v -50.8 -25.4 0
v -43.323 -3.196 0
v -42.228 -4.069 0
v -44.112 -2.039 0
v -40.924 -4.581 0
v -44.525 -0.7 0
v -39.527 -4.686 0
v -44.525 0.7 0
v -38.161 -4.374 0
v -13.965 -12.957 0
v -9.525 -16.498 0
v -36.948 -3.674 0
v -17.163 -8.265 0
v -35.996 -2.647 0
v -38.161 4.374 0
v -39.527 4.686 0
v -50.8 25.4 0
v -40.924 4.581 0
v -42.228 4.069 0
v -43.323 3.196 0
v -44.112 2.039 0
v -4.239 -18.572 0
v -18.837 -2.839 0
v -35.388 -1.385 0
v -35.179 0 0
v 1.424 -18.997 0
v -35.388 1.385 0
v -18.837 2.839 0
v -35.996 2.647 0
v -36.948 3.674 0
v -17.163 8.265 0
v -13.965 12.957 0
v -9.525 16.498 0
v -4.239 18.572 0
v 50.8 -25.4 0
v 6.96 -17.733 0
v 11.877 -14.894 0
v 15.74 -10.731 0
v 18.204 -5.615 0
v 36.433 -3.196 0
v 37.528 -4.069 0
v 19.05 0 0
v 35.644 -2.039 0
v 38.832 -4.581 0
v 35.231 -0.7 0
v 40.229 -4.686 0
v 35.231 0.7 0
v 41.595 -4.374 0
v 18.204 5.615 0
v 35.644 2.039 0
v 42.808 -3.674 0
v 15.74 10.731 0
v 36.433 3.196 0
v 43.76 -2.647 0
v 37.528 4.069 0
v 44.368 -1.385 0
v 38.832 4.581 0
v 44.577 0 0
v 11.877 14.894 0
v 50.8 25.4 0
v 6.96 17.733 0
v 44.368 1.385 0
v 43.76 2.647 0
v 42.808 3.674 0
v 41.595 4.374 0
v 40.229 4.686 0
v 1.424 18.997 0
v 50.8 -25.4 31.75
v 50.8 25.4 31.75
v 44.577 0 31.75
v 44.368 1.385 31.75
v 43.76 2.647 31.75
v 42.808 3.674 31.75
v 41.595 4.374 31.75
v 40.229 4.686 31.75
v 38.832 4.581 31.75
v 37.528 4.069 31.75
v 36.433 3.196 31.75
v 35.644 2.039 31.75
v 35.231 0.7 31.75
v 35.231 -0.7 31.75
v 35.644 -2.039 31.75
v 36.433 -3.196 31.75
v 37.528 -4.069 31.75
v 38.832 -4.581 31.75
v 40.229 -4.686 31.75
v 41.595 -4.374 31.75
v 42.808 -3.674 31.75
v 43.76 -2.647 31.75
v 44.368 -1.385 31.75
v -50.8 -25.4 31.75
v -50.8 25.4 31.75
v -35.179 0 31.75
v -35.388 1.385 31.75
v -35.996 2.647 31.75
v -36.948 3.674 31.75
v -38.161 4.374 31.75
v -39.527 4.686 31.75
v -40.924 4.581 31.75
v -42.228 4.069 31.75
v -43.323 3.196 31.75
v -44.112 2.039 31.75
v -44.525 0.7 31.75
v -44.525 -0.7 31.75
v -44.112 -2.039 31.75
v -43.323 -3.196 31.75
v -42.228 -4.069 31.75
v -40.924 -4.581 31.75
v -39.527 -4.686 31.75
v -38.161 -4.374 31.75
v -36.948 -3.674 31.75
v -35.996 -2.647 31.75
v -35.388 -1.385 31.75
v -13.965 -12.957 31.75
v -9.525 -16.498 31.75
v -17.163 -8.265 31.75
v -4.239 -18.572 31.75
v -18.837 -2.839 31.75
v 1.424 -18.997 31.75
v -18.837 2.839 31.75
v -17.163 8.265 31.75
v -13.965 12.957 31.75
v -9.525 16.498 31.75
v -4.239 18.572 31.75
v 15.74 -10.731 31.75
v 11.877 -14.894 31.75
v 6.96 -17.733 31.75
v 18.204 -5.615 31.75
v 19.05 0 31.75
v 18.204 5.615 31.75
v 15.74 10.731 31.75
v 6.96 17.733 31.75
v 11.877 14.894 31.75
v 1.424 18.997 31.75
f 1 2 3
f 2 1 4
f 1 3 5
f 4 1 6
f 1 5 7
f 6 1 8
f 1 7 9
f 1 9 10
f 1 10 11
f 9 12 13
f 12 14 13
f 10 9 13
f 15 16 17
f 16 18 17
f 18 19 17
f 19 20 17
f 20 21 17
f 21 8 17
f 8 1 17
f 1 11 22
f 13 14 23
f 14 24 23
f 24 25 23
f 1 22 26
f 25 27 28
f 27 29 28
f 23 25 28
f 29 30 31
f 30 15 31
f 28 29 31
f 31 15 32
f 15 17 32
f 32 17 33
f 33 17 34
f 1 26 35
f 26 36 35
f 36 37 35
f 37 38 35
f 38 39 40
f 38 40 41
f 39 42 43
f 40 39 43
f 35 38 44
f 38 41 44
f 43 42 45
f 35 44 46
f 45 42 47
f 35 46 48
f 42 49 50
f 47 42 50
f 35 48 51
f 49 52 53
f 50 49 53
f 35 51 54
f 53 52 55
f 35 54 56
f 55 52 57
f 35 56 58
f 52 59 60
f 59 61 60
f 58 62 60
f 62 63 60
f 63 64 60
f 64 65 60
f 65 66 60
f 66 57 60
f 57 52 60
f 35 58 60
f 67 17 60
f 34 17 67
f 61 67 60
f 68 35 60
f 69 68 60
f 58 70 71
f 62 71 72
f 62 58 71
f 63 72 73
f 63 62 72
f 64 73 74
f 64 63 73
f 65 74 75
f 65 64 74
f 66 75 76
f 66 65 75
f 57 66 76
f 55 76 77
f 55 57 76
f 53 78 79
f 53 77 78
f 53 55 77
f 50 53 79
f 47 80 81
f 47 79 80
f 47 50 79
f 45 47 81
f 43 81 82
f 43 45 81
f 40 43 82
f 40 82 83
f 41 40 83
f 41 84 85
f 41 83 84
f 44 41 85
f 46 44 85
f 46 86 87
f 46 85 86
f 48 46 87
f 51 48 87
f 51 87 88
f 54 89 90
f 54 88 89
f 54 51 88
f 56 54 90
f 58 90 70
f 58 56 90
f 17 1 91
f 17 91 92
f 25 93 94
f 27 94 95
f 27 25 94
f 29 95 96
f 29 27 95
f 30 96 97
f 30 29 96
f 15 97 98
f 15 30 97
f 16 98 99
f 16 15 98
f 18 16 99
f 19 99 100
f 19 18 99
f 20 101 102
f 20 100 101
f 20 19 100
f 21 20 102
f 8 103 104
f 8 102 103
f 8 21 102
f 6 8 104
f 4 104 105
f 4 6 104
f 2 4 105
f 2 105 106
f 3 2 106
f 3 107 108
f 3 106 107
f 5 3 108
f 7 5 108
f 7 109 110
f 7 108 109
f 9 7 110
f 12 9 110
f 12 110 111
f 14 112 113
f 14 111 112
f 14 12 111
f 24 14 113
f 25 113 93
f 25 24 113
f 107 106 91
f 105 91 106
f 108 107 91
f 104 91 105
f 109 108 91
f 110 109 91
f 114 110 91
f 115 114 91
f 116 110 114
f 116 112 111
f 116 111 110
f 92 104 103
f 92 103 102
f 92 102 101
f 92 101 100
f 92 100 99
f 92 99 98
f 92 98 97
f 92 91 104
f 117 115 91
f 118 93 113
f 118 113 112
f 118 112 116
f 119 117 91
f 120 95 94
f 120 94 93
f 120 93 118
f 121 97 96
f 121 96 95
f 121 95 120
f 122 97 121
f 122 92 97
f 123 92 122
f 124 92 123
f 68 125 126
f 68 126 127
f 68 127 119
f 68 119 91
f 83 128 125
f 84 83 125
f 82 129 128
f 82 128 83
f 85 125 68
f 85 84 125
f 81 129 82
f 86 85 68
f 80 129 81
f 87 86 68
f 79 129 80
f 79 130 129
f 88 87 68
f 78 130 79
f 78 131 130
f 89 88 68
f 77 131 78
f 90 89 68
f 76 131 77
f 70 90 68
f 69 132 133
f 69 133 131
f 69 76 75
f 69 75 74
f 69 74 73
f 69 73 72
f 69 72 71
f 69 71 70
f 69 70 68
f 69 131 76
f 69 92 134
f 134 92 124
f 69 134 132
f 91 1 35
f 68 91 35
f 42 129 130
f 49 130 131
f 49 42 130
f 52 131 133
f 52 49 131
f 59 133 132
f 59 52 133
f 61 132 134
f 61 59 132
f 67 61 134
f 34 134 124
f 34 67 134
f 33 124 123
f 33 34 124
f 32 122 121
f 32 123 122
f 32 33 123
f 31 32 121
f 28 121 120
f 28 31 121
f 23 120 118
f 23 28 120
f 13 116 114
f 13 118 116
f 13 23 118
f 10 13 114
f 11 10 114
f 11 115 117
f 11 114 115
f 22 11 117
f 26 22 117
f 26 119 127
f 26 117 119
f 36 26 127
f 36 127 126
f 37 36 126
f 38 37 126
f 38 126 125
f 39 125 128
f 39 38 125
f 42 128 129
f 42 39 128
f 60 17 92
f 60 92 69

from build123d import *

# Parameters (mm, degrees)
F0_W     = 101.6
F0_H     = 50.8
F1_DEPTH = 31.75
F2_R     = 19.05
F3_DEPTH = 31.751
F4_R     = 4.699
F5_DEPTH = 31.751


with BuildPart() as f1:
    # F0 (on Top) → F1 (new body)
    with BuildSketch(Plane.XY):
        Rectangle(F0_W, F0_H)
    extrude(amount=F1_DEPTH)

    # F2 (on Top) → F3 (cut, through all)
    with BuildSketch(Plane.XY):
        Circle(F2_R)
    extrude(amount=F3_DEPTH, mode=Mode.SUBTRACT)

    # F4 (on Top) → F5 (cut, through all)
    with BuildSketch(Plane.XY):
        with Locations((-39.878, 0)):
            Circle(F4_R)
        with Locations((39.878, 0)):
            Circle(F4_R)
    extrude(amount=F5_DEPTH, mode=Mode.SUBTRACT)


solid = f1.part
